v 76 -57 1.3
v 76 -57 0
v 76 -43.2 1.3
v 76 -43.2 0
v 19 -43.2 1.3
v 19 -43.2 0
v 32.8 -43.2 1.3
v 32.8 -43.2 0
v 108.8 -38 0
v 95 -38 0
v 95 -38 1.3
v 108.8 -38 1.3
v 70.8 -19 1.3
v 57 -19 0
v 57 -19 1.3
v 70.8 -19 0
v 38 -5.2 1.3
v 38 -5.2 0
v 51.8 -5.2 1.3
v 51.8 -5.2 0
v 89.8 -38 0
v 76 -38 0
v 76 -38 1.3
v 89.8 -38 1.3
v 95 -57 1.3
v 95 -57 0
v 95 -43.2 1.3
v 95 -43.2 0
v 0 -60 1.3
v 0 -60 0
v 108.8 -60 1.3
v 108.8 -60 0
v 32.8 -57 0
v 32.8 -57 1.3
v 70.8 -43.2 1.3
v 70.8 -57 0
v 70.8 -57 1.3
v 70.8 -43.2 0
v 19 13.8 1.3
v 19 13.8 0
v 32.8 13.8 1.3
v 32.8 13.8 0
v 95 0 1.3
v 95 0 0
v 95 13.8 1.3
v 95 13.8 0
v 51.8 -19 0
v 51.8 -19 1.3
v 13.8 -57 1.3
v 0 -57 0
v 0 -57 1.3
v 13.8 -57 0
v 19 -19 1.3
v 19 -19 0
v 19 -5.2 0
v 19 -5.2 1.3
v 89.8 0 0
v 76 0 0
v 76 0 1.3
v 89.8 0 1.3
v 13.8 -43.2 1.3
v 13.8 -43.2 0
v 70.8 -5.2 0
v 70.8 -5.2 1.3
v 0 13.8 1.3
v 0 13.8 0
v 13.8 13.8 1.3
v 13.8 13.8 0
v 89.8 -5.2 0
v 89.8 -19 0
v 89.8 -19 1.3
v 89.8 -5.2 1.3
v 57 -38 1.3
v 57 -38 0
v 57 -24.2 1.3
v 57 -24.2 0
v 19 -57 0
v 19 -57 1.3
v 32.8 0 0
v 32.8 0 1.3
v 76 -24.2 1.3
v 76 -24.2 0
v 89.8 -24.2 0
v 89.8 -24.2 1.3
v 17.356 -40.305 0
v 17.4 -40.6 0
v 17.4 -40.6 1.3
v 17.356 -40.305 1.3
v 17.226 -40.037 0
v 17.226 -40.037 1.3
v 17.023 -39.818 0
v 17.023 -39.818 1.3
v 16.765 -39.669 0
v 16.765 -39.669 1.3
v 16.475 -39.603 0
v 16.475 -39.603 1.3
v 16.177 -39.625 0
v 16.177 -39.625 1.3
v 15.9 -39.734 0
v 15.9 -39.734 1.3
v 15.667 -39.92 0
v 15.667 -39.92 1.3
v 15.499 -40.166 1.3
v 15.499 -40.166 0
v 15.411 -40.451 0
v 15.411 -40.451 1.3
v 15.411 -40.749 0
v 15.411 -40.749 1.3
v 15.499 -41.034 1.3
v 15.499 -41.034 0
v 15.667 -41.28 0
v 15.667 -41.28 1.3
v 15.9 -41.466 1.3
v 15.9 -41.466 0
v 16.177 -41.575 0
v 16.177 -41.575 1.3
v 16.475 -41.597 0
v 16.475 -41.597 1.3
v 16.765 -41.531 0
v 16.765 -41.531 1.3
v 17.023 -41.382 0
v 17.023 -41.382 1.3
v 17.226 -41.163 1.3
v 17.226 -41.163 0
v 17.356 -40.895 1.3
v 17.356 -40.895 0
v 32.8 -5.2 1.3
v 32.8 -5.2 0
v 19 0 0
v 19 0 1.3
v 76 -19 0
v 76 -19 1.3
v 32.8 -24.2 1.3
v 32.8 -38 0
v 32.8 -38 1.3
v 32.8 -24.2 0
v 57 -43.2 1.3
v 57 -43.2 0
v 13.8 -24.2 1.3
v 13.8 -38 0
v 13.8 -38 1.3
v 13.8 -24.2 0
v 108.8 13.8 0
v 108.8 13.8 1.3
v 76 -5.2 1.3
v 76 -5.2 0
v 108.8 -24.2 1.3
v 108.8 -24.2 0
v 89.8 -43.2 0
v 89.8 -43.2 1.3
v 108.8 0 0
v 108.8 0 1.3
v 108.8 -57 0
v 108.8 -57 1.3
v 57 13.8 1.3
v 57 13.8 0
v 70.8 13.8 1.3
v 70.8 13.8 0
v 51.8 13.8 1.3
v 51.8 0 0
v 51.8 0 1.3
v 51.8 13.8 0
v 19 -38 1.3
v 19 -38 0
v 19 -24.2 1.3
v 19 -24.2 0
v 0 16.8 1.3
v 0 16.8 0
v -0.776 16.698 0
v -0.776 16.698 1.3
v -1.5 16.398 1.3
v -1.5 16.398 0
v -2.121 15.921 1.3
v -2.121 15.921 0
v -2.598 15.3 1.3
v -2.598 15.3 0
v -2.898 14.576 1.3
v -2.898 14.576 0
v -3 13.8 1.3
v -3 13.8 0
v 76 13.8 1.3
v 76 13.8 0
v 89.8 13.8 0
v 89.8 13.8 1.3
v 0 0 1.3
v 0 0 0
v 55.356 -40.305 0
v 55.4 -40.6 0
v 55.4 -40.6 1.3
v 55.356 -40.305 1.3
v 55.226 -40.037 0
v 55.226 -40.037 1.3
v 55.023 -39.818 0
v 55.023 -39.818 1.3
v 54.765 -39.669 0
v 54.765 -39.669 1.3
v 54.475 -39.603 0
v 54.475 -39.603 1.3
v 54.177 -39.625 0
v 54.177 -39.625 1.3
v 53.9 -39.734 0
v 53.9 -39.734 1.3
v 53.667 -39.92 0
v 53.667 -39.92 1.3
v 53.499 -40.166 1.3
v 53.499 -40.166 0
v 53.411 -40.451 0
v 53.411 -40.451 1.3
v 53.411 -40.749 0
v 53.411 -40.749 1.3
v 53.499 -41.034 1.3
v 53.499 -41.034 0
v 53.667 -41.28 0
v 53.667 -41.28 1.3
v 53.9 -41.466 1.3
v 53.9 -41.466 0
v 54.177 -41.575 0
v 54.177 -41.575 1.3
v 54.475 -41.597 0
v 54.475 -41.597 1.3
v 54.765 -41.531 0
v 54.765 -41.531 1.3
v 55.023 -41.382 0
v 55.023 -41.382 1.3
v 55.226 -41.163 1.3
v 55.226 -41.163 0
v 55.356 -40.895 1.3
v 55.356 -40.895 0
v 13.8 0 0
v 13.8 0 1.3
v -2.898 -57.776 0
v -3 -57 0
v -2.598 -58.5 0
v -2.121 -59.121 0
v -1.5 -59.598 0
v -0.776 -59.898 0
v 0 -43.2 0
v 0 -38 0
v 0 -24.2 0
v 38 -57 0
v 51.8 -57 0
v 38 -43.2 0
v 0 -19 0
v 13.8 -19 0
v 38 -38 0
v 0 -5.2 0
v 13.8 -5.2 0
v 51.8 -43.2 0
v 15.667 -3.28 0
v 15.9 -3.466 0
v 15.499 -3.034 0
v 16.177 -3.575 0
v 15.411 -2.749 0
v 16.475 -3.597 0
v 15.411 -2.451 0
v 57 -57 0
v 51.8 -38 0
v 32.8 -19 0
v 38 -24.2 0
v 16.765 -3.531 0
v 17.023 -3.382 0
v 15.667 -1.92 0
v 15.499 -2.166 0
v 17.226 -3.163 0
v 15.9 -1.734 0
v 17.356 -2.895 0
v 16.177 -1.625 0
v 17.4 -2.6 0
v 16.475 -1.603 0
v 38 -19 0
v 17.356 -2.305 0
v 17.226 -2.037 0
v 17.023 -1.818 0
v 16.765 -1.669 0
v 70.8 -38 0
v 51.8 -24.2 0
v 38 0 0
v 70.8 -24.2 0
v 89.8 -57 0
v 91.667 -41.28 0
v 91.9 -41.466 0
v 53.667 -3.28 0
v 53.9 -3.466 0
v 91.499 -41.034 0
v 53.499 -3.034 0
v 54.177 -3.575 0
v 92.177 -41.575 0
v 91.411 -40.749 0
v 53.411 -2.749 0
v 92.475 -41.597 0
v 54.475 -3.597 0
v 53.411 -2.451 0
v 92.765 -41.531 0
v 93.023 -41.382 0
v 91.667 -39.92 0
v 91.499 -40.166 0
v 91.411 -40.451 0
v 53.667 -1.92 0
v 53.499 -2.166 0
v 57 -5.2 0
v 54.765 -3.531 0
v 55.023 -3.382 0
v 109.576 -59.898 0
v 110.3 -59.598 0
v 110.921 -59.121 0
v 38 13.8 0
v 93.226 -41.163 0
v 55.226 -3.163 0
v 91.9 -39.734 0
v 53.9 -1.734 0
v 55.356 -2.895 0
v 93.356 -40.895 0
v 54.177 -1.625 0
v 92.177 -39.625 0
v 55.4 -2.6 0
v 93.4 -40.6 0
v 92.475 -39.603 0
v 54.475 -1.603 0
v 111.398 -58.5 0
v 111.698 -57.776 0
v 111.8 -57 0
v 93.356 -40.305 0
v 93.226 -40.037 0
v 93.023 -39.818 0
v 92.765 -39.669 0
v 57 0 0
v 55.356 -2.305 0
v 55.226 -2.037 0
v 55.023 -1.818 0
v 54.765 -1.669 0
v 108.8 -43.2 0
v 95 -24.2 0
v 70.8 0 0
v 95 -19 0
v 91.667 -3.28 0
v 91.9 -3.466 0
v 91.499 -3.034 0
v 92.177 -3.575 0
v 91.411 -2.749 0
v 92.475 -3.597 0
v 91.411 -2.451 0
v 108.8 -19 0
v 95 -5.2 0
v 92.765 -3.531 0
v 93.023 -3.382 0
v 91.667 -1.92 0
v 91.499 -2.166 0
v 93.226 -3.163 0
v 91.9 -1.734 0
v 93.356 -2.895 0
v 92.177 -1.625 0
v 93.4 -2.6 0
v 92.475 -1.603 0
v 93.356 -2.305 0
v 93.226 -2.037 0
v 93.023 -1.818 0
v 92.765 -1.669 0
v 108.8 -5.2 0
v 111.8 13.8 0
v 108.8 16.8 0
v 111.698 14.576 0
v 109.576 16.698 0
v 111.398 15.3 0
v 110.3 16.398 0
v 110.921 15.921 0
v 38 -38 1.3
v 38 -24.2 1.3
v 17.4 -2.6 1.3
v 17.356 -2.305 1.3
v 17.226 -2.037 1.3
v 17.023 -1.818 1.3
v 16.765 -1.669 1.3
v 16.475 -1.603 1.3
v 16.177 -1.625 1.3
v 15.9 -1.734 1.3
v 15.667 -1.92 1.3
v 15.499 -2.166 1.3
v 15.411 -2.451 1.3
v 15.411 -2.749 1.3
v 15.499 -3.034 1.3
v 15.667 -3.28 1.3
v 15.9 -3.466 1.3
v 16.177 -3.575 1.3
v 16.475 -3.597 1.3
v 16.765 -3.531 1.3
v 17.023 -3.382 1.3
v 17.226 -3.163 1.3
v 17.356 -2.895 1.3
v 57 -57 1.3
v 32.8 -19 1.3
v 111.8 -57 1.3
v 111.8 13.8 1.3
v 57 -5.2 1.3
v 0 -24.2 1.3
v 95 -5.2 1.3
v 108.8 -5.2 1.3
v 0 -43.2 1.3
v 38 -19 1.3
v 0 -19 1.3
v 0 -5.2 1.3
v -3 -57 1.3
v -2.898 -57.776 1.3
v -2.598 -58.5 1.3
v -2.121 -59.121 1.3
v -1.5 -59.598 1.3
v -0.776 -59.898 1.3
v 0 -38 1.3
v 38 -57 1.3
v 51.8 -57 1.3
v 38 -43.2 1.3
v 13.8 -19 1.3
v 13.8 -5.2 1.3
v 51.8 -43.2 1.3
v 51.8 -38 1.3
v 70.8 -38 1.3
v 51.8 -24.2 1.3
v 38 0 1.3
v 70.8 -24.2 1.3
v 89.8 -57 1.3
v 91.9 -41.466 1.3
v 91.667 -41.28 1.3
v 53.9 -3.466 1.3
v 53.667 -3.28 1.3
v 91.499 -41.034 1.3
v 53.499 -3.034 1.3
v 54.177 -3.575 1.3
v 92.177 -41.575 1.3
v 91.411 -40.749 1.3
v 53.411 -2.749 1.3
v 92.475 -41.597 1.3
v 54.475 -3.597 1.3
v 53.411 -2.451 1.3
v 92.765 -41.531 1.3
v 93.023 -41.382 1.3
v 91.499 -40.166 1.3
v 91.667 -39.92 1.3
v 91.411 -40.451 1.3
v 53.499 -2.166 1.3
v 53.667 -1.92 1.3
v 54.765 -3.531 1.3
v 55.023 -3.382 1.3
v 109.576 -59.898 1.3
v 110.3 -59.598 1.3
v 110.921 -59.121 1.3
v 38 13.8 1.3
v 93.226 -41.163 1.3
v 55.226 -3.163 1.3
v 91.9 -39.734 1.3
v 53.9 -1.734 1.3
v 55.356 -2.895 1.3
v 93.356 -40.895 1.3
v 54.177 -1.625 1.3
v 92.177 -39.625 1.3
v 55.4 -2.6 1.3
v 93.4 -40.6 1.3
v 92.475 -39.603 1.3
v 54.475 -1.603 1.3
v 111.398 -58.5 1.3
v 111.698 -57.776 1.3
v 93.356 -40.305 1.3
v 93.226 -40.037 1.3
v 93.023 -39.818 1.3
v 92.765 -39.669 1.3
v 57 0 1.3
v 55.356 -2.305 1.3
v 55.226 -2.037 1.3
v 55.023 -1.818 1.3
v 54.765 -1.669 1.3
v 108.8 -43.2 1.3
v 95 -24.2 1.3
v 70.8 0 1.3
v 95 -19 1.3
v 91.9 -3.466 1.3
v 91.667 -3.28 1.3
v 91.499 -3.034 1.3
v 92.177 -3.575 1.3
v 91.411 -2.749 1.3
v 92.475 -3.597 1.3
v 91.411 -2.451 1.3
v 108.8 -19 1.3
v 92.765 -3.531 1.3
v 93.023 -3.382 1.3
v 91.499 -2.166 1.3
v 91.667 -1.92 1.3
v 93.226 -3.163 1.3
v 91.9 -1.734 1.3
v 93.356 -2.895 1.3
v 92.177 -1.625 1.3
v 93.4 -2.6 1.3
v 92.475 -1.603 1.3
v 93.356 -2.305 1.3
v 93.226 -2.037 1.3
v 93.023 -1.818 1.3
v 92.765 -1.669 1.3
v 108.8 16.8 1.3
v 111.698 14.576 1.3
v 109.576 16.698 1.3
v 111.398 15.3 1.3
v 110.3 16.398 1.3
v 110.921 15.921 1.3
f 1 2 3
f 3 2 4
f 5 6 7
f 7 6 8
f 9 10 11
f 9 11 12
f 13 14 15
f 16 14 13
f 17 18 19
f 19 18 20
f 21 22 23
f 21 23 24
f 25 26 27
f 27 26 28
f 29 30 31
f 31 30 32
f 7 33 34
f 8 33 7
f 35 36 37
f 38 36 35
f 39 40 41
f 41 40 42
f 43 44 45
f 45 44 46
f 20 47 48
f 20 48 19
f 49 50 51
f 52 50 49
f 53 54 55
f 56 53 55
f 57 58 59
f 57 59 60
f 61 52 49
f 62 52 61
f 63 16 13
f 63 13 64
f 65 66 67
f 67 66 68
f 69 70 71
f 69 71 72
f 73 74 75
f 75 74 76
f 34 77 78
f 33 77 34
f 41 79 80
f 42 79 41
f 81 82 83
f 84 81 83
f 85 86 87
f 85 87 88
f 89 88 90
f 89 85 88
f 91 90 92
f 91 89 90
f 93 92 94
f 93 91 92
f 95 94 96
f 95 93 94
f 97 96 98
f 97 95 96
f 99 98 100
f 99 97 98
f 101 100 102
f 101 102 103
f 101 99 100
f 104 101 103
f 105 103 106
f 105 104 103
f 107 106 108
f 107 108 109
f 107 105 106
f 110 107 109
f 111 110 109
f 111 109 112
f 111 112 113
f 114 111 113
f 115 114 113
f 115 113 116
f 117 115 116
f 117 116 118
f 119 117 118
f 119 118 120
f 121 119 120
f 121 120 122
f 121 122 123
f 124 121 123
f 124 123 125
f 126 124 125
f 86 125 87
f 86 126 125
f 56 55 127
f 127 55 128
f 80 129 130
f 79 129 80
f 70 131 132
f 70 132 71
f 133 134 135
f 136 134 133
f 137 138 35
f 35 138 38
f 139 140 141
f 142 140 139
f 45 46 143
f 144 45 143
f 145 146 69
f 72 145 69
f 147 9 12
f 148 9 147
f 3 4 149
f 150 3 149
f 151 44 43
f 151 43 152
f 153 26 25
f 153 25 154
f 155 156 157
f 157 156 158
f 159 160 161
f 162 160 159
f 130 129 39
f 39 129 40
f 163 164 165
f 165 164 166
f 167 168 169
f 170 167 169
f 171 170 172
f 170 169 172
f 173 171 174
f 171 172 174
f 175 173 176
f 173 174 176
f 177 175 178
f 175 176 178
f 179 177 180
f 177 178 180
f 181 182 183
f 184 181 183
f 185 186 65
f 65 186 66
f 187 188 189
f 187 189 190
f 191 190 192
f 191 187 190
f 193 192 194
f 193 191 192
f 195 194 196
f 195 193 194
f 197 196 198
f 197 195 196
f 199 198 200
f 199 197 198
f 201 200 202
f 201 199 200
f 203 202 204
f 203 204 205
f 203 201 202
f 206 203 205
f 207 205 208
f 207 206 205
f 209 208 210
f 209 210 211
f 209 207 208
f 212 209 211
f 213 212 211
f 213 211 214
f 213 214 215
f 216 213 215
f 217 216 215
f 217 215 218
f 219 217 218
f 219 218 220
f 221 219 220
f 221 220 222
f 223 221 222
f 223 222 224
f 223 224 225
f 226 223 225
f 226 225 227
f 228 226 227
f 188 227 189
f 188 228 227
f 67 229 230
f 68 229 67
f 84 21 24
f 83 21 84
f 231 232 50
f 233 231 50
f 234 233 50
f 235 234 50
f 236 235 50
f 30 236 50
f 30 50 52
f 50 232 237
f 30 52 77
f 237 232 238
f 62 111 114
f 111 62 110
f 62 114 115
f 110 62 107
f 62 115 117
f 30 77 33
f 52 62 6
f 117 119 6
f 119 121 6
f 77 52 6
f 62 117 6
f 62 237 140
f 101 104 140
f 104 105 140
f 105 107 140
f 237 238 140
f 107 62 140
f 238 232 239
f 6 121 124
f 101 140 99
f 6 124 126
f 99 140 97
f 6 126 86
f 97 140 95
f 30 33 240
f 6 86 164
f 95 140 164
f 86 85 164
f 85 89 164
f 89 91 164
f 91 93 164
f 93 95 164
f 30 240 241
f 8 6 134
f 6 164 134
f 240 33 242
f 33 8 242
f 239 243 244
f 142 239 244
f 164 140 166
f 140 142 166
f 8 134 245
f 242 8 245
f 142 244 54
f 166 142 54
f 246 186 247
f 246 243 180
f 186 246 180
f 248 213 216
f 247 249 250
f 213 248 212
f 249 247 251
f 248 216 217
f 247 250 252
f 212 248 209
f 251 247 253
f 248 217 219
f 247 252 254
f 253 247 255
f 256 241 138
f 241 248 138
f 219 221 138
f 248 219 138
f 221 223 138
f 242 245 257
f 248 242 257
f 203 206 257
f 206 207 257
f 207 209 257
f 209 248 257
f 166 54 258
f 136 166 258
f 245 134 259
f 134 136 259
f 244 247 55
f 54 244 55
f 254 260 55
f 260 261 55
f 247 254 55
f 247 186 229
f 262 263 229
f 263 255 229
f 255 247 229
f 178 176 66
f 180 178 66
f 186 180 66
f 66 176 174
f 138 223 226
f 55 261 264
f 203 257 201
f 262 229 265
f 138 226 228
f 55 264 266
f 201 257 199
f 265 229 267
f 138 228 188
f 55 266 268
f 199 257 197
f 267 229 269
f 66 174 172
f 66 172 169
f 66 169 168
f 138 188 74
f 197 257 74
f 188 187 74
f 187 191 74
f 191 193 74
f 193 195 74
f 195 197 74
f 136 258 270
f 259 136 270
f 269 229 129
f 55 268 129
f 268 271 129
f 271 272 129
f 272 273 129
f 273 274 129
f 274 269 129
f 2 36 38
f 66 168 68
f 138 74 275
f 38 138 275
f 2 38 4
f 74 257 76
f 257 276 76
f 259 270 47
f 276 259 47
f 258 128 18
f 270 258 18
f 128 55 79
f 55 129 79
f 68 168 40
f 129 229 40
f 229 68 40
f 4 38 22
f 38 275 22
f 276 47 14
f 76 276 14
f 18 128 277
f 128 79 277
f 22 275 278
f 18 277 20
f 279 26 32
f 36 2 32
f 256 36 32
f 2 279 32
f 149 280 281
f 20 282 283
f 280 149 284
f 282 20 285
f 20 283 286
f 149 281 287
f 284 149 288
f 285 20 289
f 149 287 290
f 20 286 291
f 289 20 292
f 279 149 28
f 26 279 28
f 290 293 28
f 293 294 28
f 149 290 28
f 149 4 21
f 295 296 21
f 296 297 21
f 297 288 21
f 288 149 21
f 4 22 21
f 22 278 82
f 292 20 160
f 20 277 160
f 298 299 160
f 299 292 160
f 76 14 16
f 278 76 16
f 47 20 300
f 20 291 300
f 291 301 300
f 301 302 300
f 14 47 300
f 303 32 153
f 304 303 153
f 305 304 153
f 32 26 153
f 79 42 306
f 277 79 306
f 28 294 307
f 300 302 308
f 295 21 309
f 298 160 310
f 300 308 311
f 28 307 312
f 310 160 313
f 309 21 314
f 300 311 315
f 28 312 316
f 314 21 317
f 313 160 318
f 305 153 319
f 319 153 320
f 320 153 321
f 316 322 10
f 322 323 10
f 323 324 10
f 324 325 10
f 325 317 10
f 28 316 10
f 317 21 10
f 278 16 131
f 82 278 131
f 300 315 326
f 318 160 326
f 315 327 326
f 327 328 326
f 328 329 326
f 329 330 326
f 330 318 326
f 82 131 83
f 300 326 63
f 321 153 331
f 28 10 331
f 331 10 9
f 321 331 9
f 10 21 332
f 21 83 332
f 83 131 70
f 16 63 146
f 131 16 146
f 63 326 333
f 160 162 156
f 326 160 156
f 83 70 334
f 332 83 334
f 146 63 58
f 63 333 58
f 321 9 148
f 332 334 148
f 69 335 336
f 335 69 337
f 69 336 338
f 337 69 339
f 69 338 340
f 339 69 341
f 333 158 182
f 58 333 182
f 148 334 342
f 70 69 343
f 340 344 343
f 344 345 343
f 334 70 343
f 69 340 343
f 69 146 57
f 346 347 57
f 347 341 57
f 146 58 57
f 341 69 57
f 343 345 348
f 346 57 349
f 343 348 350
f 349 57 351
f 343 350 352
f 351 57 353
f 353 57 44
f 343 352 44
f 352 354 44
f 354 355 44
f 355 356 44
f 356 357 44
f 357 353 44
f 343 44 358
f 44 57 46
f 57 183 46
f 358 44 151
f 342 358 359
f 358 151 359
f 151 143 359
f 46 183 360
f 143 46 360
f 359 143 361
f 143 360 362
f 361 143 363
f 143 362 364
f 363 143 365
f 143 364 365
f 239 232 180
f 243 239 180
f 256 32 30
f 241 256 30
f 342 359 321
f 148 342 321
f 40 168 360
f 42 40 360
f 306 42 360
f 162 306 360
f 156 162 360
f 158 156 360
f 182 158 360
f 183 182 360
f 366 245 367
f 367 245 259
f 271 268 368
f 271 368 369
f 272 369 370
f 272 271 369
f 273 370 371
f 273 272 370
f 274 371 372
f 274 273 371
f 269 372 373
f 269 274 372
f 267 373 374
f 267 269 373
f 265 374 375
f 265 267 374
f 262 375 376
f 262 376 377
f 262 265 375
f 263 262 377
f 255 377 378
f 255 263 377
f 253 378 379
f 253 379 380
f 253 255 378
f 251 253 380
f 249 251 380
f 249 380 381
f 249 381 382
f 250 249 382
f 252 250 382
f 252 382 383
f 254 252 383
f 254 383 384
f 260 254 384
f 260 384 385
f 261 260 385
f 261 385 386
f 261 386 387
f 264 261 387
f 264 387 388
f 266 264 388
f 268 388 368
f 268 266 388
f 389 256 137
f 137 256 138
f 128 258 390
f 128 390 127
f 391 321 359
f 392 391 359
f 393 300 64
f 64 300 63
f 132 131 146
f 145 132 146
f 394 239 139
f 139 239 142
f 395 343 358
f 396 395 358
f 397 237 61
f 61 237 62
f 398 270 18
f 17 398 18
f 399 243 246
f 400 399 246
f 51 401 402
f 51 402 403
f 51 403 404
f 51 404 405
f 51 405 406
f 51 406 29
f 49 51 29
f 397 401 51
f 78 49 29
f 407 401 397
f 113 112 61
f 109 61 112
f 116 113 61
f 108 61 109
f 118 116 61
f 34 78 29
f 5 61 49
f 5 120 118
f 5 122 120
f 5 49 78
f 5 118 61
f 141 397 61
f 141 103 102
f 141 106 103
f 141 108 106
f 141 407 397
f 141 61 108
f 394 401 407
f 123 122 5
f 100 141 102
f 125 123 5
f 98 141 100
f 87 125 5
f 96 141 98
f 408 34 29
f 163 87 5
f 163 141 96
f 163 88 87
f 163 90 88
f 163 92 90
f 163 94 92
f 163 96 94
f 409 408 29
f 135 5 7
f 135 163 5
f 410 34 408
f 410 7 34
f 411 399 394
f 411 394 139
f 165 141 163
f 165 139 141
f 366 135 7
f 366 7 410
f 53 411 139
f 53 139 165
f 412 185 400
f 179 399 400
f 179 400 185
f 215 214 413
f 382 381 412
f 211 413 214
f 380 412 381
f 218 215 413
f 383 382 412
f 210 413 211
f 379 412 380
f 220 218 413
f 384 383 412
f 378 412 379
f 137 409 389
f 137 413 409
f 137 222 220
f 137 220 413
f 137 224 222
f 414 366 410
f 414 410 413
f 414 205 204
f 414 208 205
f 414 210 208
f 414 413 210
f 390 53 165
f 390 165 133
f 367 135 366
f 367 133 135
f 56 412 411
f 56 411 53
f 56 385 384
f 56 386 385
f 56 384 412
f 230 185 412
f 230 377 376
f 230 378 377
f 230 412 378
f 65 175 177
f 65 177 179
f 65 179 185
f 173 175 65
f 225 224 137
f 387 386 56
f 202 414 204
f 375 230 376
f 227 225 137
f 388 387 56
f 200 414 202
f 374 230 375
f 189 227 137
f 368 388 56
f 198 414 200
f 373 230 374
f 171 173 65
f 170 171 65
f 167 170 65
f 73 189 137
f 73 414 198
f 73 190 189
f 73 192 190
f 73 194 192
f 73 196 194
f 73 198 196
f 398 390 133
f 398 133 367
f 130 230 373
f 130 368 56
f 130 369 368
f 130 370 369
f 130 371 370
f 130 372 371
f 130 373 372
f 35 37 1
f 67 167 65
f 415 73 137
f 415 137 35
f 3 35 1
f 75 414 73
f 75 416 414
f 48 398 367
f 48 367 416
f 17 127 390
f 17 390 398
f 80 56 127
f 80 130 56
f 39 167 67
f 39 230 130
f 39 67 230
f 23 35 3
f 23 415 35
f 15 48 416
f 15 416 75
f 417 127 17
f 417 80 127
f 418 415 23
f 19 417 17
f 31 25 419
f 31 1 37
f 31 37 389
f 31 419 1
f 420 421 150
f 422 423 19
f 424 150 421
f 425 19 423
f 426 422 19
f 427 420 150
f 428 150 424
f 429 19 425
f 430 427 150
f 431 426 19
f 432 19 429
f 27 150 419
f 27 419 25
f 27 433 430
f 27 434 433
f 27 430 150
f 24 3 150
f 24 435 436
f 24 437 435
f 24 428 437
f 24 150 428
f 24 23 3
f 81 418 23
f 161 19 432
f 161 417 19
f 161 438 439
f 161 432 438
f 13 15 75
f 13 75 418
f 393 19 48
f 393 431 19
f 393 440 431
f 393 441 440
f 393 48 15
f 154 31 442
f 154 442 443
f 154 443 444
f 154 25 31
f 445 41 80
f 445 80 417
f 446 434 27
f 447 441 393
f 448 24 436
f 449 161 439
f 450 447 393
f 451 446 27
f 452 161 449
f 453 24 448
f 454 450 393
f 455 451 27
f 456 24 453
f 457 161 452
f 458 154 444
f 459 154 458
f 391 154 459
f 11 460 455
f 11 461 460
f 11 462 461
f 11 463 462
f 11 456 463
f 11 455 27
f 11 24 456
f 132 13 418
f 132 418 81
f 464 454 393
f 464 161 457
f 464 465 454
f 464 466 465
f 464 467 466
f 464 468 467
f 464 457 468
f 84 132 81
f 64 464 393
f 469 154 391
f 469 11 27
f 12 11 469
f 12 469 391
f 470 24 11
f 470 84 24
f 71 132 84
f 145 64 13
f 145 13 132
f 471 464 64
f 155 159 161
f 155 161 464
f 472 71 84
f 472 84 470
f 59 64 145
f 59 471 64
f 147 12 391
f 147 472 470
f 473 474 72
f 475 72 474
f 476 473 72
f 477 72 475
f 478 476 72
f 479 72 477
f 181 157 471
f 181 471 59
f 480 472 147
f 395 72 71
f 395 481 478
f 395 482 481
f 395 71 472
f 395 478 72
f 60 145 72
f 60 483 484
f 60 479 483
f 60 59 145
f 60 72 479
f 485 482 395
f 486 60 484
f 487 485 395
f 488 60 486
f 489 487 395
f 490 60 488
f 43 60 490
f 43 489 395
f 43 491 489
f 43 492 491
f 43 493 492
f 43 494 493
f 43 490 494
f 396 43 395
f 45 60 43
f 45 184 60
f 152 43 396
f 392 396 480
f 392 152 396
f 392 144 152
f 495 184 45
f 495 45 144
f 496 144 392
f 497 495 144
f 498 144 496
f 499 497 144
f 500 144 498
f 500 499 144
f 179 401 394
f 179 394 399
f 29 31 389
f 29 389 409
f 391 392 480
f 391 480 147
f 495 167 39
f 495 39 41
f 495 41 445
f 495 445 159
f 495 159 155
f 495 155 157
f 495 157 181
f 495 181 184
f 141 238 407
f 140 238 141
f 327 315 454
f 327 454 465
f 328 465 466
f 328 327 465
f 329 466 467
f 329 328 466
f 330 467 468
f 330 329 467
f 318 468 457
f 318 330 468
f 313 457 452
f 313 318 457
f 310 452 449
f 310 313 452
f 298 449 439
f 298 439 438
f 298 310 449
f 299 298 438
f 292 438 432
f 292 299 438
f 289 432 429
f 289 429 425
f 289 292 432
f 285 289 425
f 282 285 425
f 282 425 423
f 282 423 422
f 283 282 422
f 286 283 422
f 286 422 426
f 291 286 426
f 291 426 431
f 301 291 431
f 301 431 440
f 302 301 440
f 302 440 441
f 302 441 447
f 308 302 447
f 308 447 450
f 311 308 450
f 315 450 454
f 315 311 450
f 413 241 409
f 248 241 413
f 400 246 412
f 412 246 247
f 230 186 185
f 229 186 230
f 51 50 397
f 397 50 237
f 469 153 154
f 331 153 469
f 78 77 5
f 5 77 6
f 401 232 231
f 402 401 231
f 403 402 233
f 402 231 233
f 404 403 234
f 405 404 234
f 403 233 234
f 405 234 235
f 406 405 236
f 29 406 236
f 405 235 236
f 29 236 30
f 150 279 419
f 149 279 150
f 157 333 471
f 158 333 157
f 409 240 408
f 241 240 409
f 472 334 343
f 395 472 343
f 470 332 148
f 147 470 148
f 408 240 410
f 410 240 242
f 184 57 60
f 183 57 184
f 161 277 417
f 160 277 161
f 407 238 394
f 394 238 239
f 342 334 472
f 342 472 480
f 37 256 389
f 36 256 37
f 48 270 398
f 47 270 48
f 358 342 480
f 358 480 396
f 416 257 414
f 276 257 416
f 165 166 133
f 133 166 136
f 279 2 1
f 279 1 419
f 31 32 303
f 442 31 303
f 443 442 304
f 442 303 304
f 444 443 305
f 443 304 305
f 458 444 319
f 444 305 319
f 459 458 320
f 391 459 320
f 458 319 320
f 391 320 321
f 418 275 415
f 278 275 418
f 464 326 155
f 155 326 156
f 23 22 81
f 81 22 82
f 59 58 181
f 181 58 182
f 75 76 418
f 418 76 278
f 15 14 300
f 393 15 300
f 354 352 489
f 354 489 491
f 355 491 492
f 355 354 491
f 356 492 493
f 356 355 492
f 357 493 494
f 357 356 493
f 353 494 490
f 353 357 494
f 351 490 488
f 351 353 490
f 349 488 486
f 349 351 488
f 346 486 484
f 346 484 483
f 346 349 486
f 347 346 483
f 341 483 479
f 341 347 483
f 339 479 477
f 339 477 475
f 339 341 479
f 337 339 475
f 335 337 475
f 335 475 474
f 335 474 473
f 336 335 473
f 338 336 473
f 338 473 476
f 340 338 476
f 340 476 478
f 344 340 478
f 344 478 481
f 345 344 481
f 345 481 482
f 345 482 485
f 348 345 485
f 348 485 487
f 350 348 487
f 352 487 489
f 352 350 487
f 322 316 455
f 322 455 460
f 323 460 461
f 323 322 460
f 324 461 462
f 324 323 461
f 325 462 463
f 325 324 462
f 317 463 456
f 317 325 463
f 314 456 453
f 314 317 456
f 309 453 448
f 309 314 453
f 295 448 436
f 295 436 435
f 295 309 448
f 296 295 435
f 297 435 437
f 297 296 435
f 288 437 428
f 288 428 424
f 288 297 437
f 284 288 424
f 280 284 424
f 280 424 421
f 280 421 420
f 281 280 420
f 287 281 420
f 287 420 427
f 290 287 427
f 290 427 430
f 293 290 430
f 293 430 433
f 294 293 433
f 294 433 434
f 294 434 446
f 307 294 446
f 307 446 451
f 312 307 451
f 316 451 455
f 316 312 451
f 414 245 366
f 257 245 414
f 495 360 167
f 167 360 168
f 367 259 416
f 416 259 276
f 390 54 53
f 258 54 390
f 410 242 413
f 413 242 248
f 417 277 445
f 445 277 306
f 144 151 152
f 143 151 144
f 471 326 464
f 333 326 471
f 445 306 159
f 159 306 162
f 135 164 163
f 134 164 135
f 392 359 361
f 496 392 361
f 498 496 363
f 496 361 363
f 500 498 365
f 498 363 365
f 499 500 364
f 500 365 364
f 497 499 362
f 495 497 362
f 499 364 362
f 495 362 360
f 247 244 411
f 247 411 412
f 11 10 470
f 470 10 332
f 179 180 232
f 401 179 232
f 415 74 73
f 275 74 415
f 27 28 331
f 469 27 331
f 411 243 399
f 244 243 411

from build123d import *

# Parameters (mm, degrees)
SKETCH_R  = 1
SKETCH_W  = 13.8
SKETCH_H  = 13.8
PAD_DEPTH = 1.3


with BuildPart() as part:
    # Sketch → Pad (new body)
    with BuildSketch(Plane.XY):
        with BuildLine():
            ThreePointArc((0, 16.8), (-2.12132, 15.92132), (-3, 13.8))
            Line((-3, 13.8), (-3, -57))
            ThreePointArc((-3, -57), (-2.12132, -59.12132), (0, -60))
            Line((0, -60), (108.8, -60))
            ThreePointArc((108.8, -60), (110.92132, -59.12132), (111.8, -57))
            Line((111.8, -57), (111.8, 13.8))
            ThreePointArc((111.8, 13.8), (110.92132, 15.92132), (108.8, 16.8))
            Line((108.8, 16.8), (0, 16.8))
        make_face()
        with Locations((92.4, -40.6)):
            Circle(SKETCH_R, mode=Mode.SUBTRACT)
        with Locations((54.4, -40.6)):
            Circle(SKETCH_R, mode=Mode.SUBTRACT)
        with Locations((16.4, -40.6)):
            Circle(SKETCH_R, mode=Mode.SUBTRACT)
        with Locations((16.4, -2.6)):
            Circle(SKETCH_R, mode=Mode.SUBTRACT)
        with Locations((54.4, -2.6)):
            Circle(SKETCH_R, mode=Mode.SUBTRACT)
        with Locations((92.4, -2.6)):
            Circle(SKETCH_R, mode=Mode.SUBTRACT)
        with Locations((6.9, 6.9)):
            Rectangle(SKETCH_W, SKETCH_H, mode=Mode.SUBTRACT)
        with Locations((25.9, 6.9)):
            Rectangle(SKETCH_W, SKETCH_H, mode=Mode.SUBTRACT)
        with Locations((44.9, 6.9)):
            Rectangle(SKETCH_W, SKETCH_H, mode=Mode.SUBTRACT)
        with Locations((63.9, 6.9)):
            Rectangle(SKETCH_W, SKETCH_H, mode=Mode.SUBTRACT)
        with Locations((82.9, 6.9)):
            Rectangle(SKETCH_W, SKETCH_H, mode=Mode.SUBTRACT)
        with Locations((101.9, 6.9)):
            Rectangle(SKETCH_W, SKETCH_H, mode=Mode.SUBTRACT)
        with Locations((6.9, -12.1)):
            Rectangle(SKETCH_W, SKETCH_H, mode=Mode.SUBTRACT)
        with Locations((25.9, -12.1)):
            Rectangle(SKETCH_W, SKETCH_H, mode=Mode.SUBTRACT)
        with Locations((44.9, -12.1)):
            Rectangle(SKETCH_W, SKETCH_H, mode=Mode.SUBTRACT)
        with Locations((63.9, -12.1)):
            Rectangle(SKETCH_W, SKETCH_H, mode=Mode.SUBTRACT)
        with Locations((82.9, -12.1)):
            Rectangle(SKETCH_W, SKETCH_H, mode=Mode.SUBTRACT)
        with Locations((101.9, -12.1)):
            Rectangle(SKETCH_W, SKETCH_H, mode=Mode.SUBTRACT)
        with Locations((6.9, -31.1)):
            Rectangle(SKETCH_W, SKETCH_H, mode=Mode.SUBTRACT)
        with Locations((25.9, -31.1)):
            Rectangle(SKETCH_W, SKETCH_H, mode=Mode.SUBTRACT)
        with Locations((44.9, -31.1)):
            Rectangle(SKETCH_W, SKETCH_H, mode=Mode.SUBTRACT)
        with Locations((63.9, -31.1)):
            Rectangle(SKETCH_W, SKETCH_H, mode=Mode.SUBTRACT)
        with Locations((82.9, -31.1)):
            Rectangle(SKETCH_W, SKETCH_H, mode=Mode.SUBTRACT)
        with Locations((101.9, -31.1)):
            Rectangle(SKETCH_W, SKETCH_H, mode=Mode.SUBTRACT)
        with Locations((6.9, -50.1)):
            Rectangle(SKETCH_W, SKETCH_H, mode=Mode.SUBTRACT)
        with Locations((25.9, -50.1)):
            Rectangle(SKETCH_W, SKETCH_H, mode=Mode.SUBTRACT)
        with Locations((44.9, -50.1)):
            Rectangle(SKETCH_W, SKETCH_H, mode=Mode.SUBTRACT)
        with Locations((63.9, -50.1)):
            Rectangle(SKETCH_W, SKETCH_H, mode=Mode.SUBTRACT)
        with Locations((82.9, -50.1)):
            Rectangle(SKETCH_W, SKETCH_H, mode=Mode.SUBTRACT)
        with Locations((101.9, -50.1)):
            Rectangle(SKETCH_W, SKETCH_H, mode=Mode.SUBTRACT)
    extrude(amount=PAD_DEPTH)


solid = part.part
